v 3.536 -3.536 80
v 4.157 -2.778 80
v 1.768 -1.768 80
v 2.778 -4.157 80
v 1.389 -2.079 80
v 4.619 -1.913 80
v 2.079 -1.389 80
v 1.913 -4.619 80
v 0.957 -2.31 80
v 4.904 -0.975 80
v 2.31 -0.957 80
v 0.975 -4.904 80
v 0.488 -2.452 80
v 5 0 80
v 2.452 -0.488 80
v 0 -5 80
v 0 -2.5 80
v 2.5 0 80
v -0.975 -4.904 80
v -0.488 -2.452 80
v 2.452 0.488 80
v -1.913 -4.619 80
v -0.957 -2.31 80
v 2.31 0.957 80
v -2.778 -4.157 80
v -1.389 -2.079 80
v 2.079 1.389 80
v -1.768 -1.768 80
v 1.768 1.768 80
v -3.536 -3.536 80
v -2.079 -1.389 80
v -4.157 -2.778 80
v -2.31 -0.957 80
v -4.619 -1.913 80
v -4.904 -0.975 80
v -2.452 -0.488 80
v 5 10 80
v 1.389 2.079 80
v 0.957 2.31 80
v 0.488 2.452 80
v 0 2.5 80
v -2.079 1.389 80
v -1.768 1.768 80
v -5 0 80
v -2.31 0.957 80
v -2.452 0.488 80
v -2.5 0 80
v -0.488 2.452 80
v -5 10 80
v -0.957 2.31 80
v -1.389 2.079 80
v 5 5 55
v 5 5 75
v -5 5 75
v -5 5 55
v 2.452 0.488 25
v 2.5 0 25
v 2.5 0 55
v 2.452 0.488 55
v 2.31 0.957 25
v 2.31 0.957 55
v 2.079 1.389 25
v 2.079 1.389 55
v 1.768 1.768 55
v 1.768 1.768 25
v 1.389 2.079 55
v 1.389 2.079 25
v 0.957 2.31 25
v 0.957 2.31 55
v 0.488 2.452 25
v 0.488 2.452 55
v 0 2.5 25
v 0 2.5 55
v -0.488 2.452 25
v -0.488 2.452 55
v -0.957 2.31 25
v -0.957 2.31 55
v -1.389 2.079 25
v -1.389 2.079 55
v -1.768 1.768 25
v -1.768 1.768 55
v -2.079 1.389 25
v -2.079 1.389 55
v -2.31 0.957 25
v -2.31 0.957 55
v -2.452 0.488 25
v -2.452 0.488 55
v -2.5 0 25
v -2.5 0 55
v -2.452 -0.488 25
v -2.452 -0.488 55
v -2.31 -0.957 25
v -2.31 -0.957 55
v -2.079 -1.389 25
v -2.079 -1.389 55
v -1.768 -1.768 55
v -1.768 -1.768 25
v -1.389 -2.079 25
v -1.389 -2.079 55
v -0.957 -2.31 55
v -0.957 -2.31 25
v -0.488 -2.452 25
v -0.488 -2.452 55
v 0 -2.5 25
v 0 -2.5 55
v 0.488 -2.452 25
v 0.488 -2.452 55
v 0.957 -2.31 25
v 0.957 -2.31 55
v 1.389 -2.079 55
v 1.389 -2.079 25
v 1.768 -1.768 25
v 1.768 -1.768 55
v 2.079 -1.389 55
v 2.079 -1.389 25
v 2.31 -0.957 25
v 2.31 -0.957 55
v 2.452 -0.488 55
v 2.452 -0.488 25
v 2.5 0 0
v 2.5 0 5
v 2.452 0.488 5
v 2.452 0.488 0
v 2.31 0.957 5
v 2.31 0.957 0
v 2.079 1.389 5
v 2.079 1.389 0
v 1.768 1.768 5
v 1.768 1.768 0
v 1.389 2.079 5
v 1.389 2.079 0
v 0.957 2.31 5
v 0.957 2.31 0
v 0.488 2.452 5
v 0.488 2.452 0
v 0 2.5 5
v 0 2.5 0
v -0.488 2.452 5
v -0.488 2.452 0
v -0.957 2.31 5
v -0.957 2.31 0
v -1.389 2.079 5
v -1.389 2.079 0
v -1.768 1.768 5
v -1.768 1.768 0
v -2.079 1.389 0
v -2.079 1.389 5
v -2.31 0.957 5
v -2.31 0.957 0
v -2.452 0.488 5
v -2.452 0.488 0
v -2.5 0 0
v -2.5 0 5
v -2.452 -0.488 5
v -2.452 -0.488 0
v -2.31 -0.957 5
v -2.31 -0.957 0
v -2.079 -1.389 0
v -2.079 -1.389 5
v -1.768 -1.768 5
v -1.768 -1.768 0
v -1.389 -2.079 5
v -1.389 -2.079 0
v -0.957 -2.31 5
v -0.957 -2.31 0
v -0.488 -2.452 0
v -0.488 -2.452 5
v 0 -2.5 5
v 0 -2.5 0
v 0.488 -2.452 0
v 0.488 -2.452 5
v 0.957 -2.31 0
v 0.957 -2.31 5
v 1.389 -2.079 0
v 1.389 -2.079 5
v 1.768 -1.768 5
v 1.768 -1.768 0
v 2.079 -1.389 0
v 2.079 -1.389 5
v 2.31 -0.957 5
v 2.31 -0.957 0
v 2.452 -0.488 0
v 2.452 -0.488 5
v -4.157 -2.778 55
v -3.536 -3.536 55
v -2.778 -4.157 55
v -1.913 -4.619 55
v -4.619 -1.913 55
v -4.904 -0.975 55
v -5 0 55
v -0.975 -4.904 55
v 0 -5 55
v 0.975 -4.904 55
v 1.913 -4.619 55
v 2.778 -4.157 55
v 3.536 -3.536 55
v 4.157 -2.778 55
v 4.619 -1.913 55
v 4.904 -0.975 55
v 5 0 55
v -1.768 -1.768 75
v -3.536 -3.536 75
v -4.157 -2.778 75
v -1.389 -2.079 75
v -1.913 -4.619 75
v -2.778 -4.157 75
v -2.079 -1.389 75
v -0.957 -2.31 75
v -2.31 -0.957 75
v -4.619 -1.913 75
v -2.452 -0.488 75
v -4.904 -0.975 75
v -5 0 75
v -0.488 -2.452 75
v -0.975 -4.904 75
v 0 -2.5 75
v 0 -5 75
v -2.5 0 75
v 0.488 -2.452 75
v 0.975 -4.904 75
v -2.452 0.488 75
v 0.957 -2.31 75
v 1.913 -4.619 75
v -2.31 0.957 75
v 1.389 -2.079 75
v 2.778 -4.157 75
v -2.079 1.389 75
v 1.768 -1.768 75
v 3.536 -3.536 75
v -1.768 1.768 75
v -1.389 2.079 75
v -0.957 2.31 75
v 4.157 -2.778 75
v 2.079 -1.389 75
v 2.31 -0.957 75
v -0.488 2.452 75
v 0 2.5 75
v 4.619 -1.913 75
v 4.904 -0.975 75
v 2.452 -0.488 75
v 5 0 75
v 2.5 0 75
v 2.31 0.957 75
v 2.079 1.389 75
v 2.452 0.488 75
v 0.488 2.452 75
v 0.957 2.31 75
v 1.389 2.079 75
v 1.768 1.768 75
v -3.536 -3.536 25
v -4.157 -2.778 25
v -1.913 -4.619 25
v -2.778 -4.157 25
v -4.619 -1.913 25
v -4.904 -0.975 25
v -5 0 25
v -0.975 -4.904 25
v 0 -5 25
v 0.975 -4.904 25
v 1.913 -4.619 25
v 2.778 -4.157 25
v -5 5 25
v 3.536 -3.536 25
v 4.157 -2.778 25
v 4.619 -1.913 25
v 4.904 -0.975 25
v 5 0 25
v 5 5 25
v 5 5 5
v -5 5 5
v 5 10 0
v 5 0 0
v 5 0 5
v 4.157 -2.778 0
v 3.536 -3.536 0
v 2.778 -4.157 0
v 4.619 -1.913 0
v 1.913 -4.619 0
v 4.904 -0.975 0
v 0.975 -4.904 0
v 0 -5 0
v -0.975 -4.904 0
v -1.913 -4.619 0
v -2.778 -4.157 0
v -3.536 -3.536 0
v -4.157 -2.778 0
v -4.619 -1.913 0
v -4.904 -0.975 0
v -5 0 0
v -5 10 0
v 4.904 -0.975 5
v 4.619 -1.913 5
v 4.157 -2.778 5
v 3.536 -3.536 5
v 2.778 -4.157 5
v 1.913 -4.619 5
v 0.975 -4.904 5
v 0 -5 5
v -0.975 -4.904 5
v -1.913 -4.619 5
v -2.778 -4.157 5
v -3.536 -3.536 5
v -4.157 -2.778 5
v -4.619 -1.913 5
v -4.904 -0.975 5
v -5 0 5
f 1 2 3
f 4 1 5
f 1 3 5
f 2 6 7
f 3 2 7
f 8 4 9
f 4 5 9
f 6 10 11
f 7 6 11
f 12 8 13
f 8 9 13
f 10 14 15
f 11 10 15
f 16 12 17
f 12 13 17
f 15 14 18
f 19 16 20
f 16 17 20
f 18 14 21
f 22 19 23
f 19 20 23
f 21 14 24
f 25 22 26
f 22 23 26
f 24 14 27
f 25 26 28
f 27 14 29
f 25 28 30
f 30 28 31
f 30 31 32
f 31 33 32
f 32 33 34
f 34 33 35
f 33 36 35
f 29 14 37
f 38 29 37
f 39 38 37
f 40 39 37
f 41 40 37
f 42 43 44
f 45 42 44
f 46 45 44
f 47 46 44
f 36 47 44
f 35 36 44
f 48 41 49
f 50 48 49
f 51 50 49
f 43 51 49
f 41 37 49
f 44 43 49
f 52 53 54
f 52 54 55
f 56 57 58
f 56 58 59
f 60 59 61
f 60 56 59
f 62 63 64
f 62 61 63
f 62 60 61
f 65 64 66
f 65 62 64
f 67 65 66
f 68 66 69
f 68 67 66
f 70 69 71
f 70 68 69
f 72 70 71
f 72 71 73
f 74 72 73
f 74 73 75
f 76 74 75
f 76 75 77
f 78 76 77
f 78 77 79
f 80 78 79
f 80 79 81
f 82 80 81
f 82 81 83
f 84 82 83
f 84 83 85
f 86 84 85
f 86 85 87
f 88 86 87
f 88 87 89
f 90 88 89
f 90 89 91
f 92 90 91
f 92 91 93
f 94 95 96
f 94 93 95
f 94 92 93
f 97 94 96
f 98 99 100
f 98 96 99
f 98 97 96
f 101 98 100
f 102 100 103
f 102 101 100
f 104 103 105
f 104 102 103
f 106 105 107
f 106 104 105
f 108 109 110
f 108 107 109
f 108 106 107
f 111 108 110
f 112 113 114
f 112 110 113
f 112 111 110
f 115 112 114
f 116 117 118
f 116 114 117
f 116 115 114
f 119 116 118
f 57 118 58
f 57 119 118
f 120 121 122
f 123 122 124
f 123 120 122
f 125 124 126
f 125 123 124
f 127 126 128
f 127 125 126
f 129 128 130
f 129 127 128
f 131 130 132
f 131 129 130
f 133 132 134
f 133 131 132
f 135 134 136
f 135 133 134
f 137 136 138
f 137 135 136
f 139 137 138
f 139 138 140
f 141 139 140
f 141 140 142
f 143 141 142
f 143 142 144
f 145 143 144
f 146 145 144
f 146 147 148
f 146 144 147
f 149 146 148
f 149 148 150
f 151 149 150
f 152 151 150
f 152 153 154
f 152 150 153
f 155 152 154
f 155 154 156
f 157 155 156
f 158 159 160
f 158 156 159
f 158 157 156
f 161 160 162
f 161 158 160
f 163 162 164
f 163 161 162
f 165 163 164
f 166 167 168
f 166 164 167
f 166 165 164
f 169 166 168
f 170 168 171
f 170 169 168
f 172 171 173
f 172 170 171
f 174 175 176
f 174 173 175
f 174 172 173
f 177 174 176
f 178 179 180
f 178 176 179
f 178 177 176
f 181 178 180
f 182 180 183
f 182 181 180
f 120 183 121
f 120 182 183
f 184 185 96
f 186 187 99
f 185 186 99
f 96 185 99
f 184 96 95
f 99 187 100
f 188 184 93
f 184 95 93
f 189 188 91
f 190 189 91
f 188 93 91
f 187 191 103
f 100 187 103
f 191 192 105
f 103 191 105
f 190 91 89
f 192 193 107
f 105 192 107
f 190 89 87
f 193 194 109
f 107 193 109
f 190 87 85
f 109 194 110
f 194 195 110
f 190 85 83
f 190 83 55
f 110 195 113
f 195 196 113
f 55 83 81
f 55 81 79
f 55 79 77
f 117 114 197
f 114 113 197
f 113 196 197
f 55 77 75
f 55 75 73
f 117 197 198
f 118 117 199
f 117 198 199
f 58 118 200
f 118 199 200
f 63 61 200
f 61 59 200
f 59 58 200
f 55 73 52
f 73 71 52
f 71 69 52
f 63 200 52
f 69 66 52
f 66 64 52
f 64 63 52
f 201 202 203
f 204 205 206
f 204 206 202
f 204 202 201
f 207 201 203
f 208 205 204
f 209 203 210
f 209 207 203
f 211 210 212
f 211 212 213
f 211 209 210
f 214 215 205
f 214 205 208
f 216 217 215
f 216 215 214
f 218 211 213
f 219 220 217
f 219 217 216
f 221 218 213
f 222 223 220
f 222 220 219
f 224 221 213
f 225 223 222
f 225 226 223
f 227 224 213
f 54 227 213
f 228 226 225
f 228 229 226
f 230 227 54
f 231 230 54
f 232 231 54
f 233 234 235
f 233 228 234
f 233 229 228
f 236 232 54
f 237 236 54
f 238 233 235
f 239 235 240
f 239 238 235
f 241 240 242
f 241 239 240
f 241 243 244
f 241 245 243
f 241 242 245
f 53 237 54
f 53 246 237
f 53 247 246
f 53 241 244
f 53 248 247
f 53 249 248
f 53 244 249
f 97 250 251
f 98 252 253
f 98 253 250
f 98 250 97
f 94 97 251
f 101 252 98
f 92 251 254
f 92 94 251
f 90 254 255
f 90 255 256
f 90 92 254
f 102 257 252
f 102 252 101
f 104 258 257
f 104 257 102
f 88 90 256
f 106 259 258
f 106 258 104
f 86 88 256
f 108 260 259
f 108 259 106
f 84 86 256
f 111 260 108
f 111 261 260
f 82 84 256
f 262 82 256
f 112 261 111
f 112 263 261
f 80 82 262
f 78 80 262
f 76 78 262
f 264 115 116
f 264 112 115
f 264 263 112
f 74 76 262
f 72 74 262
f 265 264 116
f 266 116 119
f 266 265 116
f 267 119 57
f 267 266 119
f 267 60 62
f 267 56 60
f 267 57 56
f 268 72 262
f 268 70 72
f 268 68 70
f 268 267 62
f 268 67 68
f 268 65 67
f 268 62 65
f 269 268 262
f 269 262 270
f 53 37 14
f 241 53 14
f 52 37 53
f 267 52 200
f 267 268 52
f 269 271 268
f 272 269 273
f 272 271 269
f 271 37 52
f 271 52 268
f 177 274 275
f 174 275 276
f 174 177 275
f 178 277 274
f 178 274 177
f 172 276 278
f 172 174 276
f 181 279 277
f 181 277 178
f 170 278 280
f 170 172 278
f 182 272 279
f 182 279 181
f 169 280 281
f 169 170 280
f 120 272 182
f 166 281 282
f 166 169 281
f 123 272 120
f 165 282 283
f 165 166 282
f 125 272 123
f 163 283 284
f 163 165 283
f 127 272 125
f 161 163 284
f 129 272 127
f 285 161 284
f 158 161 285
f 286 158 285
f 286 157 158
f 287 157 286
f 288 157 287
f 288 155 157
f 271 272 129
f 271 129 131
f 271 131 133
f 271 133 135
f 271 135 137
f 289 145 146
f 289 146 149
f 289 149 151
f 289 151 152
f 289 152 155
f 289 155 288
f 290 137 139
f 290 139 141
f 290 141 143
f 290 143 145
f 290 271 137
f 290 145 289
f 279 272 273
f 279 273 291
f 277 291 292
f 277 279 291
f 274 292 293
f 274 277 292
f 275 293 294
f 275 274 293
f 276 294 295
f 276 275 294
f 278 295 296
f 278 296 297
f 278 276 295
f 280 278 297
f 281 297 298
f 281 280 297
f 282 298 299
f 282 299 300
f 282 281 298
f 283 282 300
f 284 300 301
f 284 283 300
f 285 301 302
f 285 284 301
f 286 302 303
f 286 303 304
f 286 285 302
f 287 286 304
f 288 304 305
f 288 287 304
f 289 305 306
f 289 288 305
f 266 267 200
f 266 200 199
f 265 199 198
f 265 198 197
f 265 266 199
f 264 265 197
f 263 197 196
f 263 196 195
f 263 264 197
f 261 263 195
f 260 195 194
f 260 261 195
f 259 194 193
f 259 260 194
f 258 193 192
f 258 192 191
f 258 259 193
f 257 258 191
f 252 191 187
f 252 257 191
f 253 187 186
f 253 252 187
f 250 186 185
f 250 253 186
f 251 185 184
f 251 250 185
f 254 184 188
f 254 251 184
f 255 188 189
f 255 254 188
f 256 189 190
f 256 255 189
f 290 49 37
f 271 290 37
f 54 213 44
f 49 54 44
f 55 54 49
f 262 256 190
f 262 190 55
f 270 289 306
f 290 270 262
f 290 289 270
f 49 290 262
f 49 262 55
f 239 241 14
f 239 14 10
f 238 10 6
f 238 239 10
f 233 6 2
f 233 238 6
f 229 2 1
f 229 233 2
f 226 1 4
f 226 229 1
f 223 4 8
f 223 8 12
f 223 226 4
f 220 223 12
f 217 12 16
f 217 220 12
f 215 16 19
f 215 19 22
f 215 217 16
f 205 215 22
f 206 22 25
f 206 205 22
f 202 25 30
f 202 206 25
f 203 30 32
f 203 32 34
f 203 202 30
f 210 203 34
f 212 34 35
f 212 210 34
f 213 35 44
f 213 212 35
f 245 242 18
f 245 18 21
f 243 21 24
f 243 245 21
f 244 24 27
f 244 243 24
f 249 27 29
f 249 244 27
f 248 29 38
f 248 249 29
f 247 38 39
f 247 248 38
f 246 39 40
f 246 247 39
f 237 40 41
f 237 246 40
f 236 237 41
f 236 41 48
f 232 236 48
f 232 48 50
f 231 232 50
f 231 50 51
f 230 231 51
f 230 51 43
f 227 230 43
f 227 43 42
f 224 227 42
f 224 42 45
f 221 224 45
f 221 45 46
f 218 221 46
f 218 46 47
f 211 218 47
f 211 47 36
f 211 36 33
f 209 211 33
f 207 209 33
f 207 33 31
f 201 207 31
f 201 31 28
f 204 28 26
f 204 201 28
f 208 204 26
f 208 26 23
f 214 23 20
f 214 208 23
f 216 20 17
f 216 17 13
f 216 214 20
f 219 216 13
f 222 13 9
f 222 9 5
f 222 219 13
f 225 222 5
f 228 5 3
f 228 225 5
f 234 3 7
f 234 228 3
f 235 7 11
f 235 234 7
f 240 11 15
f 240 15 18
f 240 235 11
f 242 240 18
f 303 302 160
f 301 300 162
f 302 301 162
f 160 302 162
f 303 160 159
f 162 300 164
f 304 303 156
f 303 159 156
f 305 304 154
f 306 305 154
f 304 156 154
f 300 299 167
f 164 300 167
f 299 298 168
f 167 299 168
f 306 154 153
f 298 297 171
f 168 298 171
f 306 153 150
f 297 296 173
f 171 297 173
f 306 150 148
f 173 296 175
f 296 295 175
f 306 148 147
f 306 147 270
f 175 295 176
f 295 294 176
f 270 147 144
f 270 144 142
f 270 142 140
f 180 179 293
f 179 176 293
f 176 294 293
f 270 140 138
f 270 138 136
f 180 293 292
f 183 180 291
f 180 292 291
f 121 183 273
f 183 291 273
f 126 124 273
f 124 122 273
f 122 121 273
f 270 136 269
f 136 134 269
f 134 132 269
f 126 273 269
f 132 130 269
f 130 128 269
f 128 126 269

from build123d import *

# Parameters (mm, degrees)
SKETCH_1_R          = 2.5
EXTRUDE_1_DEPTH     = 80
SKETCH_2_W          = 20
SKETCH_2_H          = 15
CUT_EXTRUDE_1_DEPTH = 80


with BuildPart() as part:
    # 草图1 → 凸台-拉伸1 (new body)
    with BuildSketch(Plane.XY):
        with BuildLine():
            Line((-5, 10), (5, 10))
            Line((5, 10), (5, 0))
            ThreePointArc((5, 0), (0, -5), (-5, 0))
            Line((-5, 0), (-5, 10))
        make_face()
        Circle(SKETCH_1_R, mode=Mode.SUBTRACT)
    extrude(amount=EXTRUDE_1_DEPTH)

    # 草图2 → 切除-拉伸1 (cut)
    with BuildSketch(Plane(origin=(5, 0, 0), x_dir=(0, 0, -1), z_dir=(1, 0, 0))):
        with Locations((-15, -2.5)):
            Rectangle(SKETCH_2_W, SKETCH_2_H)
        with Locations((-65, -2.5)):
            Rectangle(SKETCH_2_W, SKETCH_2_H)
    extrude(amount=-CUT_EXTRUDE_1_DEPTH, mode=Mode.SUBTRACT)


solid = part.part
